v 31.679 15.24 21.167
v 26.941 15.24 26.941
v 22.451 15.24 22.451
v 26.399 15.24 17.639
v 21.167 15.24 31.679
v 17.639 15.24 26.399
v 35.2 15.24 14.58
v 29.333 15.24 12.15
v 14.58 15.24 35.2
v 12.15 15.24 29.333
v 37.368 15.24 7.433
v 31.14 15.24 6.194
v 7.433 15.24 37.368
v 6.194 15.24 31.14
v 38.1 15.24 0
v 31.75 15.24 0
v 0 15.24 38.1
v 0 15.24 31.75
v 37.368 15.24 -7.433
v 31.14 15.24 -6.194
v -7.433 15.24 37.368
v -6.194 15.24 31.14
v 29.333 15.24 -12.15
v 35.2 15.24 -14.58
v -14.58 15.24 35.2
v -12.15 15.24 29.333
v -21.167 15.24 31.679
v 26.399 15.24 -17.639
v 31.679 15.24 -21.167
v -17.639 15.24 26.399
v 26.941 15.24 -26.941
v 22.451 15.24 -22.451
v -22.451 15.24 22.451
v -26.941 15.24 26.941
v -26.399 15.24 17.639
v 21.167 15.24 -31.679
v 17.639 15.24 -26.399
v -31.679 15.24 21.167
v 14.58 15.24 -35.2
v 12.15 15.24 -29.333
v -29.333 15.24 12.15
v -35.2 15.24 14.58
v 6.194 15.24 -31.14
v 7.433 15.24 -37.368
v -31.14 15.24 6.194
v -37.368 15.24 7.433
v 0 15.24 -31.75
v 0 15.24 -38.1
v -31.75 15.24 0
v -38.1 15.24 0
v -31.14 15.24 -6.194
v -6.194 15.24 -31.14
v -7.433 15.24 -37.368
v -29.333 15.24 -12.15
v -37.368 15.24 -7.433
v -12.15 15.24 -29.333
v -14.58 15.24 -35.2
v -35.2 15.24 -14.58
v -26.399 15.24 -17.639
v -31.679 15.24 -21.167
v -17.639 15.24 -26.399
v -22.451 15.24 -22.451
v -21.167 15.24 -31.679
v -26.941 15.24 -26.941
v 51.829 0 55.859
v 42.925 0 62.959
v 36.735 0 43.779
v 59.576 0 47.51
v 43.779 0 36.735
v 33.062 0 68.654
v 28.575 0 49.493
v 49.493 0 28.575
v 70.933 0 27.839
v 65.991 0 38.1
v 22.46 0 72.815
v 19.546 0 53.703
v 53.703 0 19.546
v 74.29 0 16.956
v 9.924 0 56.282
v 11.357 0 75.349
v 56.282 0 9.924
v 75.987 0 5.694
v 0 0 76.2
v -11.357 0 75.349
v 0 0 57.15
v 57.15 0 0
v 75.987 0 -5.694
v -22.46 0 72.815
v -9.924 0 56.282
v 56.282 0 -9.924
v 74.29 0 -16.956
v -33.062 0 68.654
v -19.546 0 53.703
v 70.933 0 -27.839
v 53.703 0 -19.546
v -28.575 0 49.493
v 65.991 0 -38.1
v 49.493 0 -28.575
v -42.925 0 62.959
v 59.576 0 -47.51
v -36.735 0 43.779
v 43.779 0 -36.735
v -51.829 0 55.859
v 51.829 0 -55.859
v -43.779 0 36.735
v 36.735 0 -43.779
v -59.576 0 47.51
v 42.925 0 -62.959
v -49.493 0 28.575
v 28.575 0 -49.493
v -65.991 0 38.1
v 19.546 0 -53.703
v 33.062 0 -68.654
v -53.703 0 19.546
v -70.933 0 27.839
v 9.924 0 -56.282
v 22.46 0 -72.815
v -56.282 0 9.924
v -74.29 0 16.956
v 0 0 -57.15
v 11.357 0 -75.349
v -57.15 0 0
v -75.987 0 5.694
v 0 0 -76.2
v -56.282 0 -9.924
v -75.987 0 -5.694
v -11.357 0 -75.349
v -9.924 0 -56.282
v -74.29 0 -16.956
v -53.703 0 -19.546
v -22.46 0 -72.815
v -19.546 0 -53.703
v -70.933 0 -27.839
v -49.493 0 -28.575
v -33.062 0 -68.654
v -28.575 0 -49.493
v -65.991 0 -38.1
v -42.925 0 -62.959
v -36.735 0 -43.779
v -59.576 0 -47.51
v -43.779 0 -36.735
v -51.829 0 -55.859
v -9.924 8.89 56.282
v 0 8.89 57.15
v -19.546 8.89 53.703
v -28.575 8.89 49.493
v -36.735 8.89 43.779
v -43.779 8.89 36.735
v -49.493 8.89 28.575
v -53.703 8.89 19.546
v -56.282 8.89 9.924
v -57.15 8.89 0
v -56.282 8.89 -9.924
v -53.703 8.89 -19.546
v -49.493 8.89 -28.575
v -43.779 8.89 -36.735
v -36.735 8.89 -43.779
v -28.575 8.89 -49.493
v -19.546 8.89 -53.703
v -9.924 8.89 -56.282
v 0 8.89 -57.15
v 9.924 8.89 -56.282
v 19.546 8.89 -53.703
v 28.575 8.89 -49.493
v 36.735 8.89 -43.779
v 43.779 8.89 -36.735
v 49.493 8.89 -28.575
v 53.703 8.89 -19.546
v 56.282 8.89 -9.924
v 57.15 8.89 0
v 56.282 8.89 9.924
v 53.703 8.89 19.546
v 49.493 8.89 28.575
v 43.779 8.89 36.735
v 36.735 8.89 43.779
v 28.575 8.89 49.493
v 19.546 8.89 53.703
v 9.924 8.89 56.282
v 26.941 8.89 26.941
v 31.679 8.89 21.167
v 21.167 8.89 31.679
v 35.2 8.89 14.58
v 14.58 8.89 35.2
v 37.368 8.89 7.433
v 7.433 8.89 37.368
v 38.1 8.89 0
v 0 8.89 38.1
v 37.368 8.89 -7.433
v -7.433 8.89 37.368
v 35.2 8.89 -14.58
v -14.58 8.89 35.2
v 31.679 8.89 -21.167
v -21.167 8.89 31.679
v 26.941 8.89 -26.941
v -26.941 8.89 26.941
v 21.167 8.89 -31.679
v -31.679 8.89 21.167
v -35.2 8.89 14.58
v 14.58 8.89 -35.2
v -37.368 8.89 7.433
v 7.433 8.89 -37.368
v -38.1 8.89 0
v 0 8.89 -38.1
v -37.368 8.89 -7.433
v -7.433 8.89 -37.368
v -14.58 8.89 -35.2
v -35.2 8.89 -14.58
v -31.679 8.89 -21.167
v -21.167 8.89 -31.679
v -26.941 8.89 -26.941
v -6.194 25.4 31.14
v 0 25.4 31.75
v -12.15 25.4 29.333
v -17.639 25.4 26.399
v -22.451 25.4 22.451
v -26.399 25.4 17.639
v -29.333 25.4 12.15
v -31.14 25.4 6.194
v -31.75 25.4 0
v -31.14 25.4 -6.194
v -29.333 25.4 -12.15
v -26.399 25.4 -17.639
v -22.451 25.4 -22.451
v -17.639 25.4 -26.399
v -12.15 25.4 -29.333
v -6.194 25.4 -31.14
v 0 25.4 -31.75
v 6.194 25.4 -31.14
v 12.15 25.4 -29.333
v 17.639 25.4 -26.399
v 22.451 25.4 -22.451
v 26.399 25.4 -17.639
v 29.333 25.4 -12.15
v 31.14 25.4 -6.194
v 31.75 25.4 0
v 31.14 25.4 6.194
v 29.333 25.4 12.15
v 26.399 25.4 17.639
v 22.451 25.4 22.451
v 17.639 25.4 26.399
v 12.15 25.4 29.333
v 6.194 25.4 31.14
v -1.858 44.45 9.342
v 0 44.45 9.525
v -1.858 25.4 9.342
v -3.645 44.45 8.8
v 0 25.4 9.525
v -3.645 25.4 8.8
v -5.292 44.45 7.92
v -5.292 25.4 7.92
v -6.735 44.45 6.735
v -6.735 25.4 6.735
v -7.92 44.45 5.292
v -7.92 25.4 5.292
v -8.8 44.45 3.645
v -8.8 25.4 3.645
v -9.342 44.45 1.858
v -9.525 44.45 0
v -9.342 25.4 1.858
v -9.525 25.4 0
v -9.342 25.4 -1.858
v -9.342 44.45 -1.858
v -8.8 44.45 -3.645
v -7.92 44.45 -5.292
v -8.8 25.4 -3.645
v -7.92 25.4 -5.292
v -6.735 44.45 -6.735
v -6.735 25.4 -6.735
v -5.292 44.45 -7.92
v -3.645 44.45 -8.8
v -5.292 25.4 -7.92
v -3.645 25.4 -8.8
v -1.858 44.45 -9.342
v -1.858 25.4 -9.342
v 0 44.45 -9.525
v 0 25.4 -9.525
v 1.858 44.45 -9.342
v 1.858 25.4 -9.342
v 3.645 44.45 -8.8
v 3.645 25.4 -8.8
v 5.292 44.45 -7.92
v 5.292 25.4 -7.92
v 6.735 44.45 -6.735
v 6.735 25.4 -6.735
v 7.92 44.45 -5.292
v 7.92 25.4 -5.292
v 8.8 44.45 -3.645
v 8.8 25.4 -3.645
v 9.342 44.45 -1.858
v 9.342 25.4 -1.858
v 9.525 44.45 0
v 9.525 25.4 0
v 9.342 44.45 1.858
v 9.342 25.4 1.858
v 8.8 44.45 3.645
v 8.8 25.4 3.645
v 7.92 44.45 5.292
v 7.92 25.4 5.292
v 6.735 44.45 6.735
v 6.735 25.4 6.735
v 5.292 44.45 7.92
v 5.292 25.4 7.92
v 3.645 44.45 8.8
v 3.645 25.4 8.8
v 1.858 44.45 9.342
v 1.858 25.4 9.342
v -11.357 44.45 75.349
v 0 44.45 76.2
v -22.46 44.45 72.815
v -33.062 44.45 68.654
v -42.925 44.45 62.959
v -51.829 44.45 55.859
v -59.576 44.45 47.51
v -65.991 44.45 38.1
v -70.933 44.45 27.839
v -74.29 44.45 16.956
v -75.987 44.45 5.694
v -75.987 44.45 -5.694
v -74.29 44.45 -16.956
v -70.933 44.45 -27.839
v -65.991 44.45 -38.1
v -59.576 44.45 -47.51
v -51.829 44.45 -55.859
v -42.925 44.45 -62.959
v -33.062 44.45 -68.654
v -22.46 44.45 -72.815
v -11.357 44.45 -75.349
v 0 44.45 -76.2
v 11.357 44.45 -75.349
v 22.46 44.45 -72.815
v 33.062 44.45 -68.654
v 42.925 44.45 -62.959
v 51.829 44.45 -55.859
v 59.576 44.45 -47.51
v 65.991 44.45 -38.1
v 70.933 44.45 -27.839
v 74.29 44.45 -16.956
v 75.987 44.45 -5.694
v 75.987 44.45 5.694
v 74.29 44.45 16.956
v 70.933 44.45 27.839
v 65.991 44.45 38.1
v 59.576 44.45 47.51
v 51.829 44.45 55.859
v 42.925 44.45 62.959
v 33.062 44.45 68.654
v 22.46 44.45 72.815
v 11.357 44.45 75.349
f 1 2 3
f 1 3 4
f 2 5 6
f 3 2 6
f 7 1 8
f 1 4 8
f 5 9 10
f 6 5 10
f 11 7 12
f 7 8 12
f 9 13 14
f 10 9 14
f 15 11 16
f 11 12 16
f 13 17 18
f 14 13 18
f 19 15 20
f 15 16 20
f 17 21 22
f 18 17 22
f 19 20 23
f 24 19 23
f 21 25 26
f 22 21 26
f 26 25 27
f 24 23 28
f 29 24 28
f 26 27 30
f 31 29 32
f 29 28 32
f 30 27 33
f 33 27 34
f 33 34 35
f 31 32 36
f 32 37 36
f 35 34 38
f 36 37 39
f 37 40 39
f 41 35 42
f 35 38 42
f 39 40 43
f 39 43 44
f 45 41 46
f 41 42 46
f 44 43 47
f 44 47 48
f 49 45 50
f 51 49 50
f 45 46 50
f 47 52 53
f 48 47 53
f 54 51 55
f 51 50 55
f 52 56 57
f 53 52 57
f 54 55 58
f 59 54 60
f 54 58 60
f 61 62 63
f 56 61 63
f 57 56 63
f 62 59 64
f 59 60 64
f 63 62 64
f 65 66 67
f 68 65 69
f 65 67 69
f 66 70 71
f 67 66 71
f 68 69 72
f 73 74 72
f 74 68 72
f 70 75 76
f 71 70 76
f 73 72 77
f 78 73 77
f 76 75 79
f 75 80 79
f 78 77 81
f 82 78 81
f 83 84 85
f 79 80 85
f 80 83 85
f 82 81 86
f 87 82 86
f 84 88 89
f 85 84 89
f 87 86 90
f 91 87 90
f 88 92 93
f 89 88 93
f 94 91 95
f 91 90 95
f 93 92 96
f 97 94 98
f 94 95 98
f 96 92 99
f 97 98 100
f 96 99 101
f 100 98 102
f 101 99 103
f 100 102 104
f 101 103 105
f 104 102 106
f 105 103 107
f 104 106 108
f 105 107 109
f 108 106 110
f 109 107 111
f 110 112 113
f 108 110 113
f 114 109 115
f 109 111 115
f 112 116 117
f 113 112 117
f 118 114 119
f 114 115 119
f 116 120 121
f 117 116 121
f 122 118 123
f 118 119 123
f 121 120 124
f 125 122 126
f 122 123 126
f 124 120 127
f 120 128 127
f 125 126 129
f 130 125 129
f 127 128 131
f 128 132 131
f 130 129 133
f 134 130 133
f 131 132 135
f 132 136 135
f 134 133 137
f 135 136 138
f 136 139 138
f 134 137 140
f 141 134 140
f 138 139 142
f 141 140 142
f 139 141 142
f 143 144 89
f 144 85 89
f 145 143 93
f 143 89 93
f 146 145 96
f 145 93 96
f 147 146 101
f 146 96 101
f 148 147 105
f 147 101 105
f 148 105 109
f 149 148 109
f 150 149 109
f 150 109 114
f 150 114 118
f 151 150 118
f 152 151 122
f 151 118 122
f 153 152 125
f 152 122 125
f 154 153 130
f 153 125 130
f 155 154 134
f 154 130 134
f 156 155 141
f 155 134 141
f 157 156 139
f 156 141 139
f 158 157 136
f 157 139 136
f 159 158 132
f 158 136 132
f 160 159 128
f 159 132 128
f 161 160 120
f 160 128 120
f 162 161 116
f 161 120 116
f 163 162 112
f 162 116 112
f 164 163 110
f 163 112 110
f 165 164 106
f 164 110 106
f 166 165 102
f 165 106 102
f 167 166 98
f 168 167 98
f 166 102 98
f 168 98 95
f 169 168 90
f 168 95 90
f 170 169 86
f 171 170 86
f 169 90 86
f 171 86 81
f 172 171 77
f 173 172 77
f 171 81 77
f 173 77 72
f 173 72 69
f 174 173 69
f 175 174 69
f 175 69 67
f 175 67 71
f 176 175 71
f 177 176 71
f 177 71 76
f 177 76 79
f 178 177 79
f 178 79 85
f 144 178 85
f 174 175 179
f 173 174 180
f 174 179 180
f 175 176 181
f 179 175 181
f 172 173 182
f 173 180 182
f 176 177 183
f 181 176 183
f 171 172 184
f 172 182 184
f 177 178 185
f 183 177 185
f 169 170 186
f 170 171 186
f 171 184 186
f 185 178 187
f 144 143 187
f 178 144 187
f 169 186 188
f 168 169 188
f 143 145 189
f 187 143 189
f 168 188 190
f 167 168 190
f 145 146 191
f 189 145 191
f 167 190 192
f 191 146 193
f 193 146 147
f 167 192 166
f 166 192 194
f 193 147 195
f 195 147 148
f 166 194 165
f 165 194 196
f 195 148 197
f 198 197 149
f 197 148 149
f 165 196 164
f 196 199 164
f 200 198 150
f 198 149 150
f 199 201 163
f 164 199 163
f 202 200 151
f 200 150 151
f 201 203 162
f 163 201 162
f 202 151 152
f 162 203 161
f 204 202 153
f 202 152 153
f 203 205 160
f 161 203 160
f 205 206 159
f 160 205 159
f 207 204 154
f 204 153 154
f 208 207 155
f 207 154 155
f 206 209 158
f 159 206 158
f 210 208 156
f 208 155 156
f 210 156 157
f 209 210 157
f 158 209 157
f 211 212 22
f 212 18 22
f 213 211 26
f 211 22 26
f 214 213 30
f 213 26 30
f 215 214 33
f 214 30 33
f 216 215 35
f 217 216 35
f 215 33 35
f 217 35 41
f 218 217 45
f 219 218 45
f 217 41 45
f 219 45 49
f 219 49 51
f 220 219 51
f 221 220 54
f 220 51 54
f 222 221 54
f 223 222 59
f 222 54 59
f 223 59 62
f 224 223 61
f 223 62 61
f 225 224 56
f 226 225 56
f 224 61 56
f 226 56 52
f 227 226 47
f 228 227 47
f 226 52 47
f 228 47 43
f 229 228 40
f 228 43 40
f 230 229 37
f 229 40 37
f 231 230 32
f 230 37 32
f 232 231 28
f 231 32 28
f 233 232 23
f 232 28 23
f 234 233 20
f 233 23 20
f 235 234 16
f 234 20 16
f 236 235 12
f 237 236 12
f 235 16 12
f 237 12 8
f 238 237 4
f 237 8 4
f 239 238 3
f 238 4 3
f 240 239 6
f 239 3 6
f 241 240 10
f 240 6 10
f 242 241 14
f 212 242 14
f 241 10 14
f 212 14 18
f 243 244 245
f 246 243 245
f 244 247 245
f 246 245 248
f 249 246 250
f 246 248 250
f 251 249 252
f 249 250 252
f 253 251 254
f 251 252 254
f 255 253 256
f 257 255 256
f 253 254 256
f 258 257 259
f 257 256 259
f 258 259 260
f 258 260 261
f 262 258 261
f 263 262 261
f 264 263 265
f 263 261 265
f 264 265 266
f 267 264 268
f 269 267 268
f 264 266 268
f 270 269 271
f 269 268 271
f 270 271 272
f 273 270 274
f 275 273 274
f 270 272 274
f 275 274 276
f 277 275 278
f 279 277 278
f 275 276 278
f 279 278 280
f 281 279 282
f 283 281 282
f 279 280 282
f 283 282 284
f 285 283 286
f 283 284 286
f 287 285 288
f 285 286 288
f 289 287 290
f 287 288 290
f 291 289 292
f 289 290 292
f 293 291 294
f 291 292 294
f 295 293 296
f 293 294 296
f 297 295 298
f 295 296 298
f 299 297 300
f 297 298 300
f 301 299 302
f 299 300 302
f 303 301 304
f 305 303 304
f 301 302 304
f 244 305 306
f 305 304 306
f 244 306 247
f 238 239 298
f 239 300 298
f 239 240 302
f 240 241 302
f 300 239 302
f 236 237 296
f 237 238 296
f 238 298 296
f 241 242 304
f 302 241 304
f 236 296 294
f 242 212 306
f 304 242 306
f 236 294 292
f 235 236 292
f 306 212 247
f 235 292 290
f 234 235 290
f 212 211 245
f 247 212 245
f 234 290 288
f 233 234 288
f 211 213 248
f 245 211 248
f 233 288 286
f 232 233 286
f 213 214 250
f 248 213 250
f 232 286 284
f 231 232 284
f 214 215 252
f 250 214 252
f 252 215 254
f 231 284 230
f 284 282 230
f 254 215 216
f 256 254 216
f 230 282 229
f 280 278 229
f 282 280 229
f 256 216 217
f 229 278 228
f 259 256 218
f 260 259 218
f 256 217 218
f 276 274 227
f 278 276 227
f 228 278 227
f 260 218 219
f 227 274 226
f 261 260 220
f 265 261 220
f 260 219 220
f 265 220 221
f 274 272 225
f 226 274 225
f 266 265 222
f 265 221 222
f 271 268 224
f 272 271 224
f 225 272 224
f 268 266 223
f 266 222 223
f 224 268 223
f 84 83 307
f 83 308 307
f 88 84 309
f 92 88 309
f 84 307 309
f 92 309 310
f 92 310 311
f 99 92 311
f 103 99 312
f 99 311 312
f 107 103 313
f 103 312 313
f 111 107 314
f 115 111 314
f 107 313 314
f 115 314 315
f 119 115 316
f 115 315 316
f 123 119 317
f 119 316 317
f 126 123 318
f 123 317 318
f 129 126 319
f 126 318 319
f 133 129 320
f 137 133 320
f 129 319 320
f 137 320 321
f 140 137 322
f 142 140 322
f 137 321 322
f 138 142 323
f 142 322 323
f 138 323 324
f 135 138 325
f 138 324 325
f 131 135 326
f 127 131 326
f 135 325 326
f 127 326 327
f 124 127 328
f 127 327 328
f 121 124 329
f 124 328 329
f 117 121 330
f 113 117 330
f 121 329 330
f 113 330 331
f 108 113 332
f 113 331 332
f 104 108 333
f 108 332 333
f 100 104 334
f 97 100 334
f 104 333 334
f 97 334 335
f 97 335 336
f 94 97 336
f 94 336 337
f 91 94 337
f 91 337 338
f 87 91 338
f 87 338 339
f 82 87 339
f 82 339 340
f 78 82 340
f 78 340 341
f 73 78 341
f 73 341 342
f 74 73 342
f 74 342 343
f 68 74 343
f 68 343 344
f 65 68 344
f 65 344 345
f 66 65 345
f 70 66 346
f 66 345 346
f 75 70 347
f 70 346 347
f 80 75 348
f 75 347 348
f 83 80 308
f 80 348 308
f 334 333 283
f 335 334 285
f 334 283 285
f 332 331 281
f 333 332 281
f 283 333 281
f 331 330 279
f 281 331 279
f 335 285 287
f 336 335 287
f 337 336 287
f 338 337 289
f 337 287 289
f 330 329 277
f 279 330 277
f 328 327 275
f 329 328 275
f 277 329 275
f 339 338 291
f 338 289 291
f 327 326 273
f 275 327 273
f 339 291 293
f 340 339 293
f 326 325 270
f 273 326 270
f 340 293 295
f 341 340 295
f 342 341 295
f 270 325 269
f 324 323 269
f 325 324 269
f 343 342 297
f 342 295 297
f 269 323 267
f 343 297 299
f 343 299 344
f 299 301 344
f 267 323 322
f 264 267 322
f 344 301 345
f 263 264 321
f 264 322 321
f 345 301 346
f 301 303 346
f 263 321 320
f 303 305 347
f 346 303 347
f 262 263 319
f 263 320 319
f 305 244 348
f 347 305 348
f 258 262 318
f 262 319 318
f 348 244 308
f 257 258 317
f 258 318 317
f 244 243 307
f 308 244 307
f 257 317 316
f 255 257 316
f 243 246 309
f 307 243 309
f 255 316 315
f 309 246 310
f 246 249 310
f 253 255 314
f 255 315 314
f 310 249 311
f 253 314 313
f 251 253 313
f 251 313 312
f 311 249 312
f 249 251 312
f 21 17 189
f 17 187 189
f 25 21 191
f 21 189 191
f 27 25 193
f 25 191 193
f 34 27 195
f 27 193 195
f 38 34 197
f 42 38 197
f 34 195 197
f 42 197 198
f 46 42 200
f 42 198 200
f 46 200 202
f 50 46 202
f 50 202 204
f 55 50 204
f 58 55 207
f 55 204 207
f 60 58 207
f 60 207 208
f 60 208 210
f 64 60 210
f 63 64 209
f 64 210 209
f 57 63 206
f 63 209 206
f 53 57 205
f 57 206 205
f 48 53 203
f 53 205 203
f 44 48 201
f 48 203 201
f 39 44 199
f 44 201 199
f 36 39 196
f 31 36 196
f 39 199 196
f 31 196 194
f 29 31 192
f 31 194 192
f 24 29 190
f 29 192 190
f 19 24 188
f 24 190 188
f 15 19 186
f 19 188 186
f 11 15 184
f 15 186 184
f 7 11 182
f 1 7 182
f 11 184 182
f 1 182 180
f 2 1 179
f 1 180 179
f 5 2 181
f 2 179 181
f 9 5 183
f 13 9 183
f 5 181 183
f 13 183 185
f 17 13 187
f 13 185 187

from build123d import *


with BuildPart() as part:
    # Main Shape Profile → Main Shape (revolve)
    with BuildSketch(Plane.XY, mode=Mode.PRIVATE) as main_shape_sk:
        Polygon((9.525, 44.45), (9.525, 25.4), (31.75, 25.4), (31.75, 15.24), (38.1, 15.24), (38.1, 8.89), (57.15, 8.89), (57.15, 0), (76.2, 0), (76.2, 44.45), align=None)
    revolve(main_shape_sk.sketch.rotate(Axis((0, 0, 0), (0, -1, 0)), 90), axis=Axis((0, 0, 0), (0, -1, 0)))


solid = part.part
